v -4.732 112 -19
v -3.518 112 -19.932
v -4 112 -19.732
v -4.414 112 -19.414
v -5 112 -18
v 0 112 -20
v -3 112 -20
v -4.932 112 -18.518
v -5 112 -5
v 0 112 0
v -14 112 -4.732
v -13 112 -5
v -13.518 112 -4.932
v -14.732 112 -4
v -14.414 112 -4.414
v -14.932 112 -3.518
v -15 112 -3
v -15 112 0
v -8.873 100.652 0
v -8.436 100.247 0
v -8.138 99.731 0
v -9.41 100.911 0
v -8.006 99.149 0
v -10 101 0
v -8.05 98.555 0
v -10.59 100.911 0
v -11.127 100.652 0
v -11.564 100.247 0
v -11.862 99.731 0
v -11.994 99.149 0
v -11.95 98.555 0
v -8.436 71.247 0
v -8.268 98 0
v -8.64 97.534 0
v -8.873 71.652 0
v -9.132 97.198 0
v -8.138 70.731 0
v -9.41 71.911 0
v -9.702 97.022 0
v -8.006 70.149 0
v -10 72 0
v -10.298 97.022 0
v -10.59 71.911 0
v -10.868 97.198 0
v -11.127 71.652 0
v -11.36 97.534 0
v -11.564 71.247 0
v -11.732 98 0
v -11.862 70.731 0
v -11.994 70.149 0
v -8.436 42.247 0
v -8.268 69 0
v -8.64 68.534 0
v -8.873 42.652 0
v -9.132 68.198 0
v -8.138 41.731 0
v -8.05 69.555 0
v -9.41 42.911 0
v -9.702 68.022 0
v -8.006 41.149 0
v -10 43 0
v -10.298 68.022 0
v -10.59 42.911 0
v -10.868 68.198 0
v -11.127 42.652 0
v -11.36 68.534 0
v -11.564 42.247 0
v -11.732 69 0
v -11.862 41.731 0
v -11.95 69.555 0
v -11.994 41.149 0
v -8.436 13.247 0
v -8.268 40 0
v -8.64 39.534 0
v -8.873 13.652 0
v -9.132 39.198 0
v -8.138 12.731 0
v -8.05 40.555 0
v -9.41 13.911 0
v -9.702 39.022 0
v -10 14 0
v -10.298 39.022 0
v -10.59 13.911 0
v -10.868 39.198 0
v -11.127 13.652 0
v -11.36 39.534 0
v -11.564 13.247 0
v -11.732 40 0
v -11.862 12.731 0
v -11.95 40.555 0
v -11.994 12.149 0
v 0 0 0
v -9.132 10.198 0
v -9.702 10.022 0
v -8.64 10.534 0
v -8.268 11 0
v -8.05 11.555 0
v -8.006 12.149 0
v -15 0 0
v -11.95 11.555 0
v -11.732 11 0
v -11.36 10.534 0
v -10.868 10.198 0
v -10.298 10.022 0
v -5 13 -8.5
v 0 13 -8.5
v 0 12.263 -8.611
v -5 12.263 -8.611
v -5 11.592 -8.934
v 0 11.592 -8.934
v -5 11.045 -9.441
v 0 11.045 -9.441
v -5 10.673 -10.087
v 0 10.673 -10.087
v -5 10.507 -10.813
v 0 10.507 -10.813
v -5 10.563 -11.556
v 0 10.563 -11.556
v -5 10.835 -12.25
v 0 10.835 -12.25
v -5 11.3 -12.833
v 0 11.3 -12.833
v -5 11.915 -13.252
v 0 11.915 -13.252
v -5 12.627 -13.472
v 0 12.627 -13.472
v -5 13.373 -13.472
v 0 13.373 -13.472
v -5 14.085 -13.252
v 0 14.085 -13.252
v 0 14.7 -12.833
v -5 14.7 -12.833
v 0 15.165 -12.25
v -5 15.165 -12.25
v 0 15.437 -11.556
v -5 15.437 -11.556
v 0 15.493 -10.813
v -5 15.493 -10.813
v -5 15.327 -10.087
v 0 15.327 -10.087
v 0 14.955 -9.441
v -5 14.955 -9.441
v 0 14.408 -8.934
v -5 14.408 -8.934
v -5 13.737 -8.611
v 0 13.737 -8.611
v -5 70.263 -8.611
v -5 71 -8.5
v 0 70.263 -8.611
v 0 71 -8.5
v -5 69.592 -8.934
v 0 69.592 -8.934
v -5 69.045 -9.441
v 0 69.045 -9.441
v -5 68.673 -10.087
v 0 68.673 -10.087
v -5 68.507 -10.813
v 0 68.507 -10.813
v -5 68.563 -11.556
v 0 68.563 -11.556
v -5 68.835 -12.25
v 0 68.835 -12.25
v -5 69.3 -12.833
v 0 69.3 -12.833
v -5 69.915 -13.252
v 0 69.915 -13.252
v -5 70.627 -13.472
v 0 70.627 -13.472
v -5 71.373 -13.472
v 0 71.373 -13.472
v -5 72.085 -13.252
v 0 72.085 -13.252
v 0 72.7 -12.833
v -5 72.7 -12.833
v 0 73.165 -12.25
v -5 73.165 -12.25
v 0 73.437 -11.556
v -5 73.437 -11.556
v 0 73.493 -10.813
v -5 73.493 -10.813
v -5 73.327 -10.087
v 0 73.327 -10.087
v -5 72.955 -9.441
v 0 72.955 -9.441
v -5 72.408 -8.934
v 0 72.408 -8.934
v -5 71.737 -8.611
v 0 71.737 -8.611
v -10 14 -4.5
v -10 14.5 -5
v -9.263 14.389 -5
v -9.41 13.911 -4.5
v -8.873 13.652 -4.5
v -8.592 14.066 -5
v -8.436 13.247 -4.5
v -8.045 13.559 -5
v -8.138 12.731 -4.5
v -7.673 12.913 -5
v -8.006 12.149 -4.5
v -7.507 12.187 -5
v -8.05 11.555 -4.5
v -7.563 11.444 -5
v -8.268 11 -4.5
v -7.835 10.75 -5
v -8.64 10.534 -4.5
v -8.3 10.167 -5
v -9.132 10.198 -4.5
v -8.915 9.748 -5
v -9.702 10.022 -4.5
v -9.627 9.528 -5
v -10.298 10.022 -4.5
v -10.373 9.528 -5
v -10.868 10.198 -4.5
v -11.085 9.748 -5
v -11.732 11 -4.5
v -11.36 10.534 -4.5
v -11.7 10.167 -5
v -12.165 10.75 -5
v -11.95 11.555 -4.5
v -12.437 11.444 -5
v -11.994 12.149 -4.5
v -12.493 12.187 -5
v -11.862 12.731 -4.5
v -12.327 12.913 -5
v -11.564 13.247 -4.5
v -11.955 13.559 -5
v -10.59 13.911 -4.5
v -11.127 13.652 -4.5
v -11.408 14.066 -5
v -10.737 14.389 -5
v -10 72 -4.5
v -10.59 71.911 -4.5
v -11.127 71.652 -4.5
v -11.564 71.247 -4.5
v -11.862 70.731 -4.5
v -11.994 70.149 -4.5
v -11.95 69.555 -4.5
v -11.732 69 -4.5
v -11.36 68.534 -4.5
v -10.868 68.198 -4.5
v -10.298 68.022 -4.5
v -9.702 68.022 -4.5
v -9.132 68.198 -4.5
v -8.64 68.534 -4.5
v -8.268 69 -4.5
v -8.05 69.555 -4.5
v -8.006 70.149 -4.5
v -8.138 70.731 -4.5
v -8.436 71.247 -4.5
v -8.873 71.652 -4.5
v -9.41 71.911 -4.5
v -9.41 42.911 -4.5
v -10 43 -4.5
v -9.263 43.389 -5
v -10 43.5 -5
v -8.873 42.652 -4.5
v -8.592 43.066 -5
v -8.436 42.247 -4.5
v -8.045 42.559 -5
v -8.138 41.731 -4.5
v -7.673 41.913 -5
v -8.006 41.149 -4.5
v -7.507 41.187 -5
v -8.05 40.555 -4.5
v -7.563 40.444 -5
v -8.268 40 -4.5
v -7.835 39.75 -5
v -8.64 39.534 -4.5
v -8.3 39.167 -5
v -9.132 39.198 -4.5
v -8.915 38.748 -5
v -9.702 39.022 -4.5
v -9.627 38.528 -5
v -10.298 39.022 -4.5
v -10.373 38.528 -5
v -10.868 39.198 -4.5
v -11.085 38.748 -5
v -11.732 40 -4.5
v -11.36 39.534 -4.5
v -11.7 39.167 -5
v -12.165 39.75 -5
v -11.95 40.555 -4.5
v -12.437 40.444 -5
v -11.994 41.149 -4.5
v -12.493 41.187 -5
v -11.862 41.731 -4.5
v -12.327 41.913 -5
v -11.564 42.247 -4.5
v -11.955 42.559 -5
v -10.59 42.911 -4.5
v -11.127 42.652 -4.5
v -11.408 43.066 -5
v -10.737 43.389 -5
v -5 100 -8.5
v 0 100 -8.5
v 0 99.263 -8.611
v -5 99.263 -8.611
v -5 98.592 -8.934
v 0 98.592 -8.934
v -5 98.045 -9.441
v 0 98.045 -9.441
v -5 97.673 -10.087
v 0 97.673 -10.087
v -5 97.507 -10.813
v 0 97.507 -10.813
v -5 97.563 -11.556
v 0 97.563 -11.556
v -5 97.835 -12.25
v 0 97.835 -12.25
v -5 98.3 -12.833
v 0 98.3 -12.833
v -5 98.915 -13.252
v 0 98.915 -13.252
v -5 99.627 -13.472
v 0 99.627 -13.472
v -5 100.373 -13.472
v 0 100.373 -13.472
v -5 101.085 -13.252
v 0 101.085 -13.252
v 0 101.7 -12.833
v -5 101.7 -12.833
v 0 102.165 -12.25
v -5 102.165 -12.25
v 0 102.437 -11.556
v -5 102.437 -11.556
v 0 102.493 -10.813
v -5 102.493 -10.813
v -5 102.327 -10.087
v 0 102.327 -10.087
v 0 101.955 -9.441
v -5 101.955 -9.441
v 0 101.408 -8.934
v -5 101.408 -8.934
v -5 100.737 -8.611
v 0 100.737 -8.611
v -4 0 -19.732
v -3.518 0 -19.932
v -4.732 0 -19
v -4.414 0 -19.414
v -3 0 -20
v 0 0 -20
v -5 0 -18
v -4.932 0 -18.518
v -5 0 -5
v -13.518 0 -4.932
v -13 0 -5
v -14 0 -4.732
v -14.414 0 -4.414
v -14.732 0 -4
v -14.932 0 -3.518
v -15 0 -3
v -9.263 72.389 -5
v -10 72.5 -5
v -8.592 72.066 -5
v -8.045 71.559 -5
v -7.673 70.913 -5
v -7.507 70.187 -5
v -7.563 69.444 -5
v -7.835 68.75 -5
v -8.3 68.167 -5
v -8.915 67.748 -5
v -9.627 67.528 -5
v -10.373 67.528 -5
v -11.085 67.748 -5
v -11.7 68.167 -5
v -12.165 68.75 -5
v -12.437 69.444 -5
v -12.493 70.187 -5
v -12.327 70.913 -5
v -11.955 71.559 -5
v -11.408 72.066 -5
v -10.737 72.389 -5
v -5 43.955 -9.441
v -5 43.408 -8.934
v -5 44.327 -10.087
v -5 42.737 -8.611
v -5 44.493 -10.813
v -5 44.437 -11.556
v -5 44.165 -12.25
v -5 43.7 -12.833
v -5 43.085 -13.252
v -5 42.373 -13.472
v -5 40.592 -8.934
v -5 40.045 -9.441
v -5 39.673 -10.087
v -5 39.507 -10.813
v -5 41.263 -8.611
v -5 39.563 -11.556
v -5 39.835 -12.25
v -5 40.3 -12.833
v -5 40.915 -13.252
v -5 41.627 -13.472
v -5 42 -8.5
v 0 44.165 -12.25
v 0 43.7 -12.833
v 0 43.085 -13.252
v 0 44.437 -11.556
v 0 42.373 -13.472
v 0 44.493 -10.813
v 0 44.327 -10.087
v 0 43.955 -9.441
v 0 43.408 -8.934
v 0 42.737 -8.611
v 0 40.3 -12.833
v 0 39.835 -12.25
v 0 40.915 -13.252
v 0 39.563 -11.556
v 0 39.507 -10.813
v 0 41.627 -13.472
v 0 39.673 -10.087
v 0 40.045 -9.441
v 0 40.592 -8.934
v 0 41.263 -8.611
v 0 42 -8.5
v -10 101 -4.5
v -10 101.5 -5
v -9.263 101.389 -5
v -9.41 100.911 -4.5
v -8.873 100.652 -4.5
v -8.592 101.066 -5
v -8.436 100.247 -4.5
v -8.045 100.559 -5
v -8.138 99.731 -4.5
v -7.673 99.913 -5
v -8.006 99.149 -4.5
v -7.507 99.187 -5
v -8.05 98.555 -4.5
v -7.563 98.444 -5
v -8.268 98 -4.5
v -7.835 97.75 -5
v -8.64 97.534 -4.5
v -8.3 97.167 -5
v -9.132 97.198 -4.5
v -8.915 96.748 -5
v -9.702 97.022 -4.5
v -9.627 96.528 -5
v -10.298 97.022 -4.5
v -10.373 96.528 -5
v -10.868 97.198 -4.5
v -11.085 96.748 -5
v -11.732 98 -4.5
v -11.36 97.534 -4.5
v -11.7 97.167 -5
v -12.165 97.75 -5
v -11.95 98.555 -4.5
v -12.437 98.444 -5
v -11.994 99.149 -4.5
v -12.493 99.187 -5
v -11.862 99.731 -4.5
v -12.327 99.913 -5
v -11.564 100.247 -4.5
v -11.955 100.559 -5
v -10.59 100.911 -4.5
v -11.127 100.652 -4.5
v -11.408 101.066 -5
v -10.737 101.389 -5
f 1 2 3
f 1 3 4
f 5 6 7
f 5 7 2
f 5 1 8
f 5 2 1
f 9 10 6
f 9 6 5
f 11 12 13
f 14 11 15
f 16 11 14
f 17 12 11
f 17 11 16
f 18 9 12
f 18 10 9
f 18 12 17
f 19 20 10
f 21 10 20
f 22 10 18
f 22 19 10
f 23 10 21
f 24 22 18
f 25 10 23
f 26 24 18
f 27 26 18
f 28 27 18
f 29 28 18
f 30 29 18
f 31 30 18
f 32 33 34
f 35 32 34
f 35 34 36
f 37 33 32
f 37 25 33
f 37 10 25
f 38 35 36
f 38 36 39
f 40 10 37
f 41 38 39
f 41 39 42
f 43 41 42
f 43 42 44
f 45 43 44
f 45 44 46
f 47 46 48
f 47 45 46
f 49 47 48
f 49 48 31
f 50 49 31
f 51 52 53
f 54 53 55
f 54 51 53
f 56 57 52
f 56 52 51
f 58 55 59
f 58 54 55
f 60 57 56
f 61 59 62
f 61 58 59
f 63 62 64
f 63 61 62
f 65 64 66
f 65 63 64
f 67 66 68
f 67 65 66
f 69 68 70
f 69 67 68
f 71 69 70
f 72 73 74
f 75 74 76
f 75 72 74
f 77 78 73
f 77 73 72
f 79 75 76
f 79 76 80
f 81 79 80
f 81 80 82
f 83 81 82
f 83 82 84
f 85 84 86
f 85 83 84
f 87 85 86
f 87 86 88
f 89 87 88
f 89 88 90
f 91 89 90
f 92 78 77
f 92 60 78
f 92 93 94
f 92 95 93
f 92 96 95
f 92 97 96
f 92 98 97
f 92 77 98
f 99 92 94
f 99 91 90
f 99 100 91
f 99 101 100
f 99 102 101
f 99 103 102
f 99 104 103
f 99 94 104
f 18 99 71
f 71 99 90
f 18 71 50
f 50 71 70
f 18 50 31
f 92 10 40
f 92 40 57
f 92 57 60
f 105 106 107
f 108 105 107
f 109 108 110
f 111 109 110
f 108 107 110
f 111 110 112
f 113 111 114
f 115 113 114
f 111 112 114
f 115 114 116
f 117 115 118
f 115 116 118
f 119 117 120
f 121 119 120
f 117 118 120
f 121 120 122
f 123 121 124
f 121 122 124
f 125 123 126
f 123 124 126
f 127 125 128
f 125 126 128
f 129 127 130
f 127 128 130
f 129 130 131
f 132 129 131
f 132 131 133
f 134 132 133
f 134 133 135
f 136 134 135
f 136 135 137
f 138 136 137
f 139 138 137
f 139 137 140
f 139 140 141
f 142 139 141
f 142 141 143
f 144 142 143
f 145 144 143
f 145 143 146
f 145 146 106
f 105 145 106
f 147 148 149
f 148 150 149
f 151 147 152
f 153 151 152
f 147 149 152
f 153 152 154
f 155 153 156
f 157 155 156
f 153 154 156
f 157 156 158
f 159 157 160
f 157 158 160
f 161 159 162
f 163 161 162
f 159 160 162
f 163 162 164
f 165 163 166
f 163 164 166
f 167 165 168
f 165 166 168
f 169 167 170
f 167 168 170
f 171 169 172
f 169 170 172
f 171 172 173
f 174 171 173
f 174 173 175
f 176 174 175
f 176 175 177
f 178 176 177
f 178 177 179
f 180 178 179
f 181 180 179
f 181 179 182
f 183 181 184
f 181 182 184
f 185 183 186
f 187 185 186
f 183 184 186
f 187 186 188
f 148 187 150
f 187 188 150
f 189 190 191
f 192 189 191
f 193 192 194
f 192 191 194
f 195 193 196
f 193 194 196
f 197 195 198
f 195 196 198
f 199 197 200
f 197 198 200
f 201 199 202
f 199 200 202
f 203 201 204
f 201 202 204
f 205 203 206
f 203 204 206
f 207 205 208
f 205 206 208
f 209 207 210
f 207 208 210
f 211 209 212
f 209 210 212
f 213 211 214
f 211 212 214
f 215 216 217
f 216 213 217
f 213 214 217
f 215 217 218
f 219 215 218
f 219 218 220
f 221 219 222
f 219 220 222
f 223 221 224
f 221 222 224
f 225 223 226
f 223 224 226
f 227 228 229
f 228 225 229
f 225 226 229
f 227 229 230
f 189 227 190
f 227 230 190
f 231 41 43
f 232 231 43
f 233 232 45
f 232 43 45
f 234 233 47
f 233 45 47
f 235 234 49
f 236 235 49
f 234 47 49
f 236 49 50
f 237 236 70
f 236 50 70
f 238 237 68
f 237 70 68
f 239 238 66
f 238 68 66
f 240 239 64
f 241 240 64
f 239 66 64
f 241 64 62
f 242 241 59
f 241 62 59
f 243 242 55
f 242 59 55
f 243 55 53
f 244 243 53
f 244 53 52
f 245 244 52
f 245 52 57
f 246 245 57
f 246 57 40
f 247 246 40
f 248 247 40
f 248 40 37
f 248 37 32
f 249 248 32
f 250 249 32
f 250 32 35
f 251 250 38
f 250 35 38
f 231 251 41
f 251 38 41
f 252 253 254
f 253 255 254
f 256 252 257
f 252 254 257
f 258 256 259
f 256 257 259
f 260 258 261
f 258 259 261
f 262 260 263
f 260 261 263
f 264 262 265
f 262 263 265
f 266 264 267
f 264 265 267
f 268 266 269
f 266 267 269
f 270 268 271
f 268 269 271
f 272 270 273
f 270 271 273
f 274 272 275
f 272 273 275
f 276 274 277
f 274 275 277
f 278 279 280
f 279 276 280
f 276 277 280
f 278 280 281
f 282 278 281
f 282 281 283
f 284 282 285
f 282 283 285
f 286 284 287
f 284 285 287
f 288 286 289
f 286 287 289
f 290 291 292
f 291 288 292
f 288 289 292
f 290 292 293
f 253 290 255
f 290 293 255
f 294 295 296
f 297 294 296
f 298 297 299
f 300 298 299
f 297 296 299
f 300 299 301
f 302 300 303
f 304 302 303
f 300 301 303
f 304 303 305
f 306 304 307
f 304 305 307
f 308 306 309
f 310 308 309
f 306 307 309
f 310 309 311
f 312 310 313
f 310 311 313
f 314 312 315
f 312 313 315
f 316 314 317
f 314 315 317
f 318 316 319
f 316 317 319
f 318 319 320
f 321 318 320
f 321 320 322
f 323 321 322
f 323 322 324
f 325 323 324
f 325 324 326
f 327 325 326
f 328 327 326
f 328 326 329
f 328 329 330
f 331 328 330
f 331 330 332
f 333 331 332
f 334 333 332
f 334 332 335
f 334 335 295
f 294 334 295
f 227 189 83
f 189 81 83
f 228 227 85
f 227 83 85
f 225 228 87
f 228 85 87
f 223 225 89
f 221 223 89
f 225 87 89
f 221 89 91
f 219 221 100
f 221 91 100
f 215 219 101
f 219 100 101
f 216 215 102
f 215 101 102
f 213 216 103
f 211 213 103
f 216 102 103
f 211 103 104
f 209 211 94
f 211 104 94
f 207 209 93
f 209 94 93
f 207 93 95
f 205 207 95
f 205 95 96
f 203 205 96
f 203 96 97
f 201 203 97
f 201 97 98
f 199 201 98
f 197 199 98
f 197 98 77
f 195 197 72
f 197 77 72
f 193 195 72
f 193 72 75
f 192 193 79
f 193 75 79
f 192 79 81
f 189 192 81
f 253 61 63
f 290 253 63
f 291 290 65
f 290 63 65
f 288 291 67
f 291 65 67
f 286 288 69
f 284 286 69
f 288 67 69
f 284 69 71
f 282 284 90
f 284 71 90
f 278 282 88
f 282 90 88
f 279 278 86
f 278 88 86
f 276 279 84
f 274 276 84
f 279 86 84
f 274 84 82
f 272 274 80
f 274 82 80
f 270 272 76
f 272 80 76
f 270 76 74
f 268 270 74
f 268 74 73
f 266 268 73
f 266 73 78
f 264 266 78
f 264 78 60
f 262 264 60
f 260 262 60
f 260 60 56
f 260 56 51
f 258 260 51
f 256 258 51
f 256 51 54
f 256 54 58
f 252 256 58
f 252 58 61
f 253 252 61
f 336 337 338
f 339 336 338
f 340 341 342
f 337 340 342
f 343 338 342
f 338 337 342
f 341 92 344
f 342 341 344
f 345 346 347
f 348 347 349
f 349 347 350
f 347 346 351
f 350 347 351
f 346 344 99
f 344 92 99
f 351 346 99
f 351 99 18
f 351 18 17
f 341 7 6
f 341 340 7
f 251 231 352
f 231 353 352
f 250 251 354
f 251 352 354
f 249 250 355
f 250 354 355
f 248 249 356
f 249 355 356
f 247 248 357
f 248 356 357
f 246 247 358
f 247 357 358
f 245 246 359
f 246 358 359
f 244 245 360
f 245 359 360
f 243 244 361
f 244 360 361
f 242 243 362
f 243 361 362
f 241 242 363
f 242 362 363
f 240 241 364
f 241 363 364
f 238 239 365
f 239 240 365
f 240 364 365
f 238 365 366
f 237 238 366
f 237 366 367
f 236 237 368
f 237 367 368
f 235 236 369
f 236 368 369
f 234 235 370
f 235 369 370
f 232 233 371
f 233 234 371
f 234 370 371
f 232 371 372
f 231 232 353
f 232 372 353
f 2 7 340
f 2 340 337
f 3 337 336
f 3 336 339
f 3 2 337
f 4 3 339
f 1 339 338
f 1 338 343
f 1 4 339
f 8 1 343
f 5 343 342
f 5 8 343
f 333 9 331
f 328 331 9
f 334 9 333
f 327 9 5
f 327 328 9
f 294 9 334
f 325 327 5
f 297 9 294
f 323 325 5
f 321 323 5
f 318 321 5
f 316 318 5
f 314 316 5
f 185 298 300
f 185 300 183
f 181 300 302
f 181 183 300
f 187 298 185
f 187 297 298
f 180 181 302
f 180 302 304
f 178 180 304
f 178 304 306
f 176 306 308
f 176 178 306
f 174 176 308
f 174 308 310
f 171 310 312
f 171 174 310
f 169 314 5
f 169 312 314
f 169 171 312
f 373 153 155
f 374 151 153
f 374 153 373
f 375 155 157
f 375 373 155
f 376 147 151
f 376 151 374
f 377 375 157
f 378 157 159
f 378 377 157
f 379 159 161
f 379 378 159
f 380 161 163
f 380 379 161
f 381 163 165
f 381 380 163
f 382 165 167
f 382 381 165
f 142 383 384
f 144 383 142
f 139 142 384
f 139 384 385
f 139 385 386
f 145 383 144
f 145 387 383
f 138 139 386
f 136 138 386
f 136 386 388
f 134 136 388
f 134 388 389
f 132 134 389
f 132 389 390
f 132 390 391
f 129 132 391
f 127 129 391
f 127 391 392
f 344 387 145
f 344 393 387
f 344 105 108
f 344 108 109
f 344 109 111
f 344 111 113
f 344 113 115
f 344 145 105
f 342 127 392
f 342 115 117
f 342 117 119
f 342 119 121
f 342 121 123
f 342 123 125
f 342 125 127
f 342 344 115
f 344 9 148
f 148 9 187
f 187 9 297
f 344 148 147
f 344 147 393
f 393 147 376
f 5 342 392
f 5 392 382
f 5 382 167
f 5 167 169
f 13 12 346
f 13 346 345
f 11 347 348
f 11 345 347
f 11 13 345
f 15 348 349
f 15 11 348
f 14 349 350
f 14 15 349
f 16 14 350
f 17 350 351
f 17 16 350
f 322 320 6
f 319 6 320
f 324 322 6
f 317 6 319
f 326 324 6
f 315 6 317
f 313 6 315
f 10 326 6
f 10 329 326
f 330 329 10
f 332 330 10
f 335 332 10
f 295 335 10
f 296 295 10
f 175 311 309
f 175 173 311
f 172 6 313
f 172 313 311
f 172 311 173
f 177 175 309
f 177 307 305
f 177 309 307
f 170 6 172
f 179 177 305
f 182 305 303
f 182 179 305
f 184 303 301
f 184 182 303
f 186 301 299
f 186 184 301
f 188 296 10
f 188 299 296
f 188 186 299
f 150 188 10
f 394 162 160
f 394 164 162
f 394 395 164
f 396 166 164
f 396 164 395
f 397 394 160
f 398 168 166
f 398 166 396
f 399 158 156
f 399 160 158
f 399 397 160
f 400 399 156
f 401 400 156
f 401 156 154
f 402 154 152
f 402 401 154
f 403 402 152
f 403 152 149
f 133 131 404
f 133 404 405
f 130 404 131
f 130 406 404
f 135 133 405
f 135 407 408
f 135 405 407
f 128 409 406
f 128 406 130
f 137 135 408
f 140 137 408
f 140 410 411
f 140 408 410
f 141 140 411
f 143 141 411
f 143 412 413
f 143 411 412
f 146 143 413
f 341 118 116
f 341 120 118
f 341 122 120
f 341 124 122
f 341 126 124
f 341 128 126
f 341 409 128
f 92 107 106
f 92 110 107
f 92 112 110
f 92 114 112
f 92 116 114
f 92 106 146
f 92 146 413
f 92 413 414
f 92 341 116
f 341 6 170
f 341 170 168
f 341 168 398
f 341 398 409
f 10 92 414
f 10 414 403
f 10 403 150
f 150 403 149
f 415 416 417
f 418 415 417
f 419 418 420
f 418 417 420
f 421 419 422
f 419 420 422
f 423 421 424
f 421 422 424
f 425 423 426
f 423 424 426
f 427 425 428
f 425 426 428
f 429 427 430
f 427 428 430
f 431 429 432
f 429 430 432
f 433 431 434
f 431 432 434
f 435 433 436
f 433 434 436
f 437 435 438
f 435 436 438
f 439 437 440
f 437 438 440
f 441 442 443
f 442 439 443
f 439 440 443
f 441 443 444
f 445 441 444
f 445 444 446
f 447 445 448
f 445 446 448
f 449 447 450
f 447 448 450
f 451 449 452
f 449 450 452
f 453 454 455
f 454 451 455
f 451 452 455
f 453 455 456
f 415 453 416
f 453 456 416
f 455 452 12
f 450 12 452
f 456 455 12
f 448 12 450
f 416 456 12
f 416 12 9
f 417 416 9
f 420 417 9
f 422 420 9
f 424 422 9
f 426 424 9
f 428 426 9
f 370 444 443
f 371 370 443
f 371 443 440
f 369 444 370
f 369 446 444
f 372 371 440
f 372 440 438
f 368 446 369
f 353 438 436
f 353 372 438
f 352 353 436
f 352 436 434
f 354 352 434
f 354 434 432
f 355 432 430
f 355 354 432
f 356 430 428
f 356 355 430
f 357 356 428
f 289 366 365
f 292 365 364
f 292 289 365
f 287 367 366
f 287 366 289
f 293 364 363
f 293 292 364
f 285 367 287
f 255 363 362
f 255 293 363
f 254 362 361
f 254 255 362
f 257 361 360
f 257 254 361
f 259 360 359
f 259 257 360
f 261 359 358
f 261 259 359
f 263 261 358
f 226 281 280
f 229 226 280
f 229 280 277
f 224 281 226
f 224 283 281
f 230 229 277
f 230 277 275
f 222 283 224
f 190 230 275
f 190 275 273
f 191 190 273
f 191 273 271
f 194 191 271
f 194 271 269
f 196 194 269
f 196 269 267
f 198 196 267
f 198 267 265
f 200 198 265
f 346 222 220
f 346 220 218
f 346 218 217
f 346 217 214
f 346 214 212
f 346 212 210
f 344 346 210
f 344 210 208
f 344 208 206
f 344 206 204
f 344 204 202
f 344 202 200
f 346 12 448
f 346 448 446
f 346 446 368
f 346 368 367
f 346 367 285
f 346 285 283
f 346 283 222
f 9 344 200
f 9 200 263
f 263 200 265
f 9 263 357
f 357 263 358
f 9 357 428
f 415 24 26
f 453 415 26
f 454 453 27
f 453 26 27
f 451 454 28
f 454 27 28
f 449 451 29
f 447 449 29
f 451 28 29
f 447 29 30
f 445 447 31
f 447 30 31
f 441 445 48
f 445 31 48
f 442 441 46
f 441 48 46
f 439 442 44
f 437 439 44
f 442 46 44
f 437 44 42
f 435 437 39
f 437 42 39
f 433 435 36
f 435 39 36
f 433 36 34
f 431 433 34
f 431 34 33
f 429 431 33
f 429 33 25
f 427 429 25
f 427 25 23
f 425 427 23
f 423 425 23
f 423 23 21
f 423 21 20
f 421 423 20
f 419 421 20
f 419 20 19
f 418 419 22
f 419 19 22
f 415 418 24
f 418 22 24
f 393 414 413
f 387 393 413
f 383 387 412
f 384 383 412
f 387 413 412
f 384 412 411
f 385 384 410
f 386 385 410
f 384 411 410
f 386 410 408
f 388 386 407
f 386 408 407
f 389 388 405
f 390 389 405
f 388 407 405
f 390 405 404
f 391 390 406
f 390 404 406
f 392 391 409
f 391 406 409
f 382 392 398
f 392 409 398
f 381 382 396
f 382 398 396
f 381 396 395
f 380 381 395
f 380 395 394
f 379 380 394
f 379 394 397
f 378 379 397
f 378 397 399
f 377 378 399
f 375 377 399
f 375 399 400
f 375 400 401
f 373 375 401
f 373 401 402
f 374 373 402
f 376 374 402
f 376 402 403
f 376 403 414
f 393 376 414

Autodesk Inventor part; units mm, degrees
ref_plane "YZ Plane" through (0, 0, 0) normal (1, 0, 0) x (0, 1, 0)
ref_plane "XZ Plane" through (0, 0, 0) normal (0, 1, 0) x (-1, 0, 0)
ref_plane "XY Plane" through (0, 0, 0) normal (0, 0, 1) x (1, 0, 0)
sketch "Skizze2" plane through (0, 0, 0) normal (0, 1, 0) x (-1, 0, 0)
  line L0 (0, 0) -> (15, 0)
  line L1 (15, 0) -> (15, -5)
  line L2 (15, -5) -> (5, -5)
  line L3 (5, -5) -> (5, -20)
  line L4 (5, -20) -> (0, -20)
  line L5 (0, -20) -> (0, 0)
  dimension "d6" = 5
  dimension "d7" = 15
  dimension "d8" = 5
  dimension "d9" = 10
extrude "Extrusion1" add sketch "Skizze2" along normal blind 112
sketch "Skizze3" plane through (-5, 0, -5) normal (0, 0, -1) x (-1, 0, 0)
  line L0 (0, 112) -> (10, 112) projected
  line L1 (-5, 0) -> (-5, 112) projected
  point P0 (5, 99)
  point P1 (5, 70)
  point P2 (5, 41)
  point P3 (5, 12)
  point P4 (5, 112)
  point P5 (5, 112)
  dimension "d12" = 13
  dimension "d13" = 29
  dimension "d14" = 29
  dimension "d15" = 29
  dimension "d39" = 10
hole "Bohrung1" at (-10, 99, -5) at (-10, 70, -5) at (-10, 41, -5) at (-10, 12, -5) direction (0, 0, 1) diameter 4 depth 5 countersink diameter 5 countersink angle 90
sketch "Skizze4" plane through (-5, 0, -20) normal (-1, 0, 0) x (0, 0, 1)
  line L0 (0, 112) -> (15, 112) projected
  line L1 (0, 0) -> (15, 0) projected
  line L2 (20, 0) -> (20, 112) projected
  point P0 (9, 100)
  point P1 (9, 71)
  point P2 (9, 42)
  point P3 (9, 13)
  point P4 (7.5, 0)
  dimension "d30" = 12
  dimension "d31" = 29
  dimension "d32" = 29
  dimension "d33" = 29
  dimension "d40" = 11
hole "Bohrung2" at (-5, 100, -11) at (-5, 71, -11) at (-5, 42, -11) at (-5, 13, -11) direction (1, 0, 0) diameter 5 end through all
fillet "Rundung1" radius 2 2 edges at (-5, 56, -20) (-15, 56, -5)
equation "\"d32\" = d31"
equation "\"d33\" = d32"
properties part number "1014"
